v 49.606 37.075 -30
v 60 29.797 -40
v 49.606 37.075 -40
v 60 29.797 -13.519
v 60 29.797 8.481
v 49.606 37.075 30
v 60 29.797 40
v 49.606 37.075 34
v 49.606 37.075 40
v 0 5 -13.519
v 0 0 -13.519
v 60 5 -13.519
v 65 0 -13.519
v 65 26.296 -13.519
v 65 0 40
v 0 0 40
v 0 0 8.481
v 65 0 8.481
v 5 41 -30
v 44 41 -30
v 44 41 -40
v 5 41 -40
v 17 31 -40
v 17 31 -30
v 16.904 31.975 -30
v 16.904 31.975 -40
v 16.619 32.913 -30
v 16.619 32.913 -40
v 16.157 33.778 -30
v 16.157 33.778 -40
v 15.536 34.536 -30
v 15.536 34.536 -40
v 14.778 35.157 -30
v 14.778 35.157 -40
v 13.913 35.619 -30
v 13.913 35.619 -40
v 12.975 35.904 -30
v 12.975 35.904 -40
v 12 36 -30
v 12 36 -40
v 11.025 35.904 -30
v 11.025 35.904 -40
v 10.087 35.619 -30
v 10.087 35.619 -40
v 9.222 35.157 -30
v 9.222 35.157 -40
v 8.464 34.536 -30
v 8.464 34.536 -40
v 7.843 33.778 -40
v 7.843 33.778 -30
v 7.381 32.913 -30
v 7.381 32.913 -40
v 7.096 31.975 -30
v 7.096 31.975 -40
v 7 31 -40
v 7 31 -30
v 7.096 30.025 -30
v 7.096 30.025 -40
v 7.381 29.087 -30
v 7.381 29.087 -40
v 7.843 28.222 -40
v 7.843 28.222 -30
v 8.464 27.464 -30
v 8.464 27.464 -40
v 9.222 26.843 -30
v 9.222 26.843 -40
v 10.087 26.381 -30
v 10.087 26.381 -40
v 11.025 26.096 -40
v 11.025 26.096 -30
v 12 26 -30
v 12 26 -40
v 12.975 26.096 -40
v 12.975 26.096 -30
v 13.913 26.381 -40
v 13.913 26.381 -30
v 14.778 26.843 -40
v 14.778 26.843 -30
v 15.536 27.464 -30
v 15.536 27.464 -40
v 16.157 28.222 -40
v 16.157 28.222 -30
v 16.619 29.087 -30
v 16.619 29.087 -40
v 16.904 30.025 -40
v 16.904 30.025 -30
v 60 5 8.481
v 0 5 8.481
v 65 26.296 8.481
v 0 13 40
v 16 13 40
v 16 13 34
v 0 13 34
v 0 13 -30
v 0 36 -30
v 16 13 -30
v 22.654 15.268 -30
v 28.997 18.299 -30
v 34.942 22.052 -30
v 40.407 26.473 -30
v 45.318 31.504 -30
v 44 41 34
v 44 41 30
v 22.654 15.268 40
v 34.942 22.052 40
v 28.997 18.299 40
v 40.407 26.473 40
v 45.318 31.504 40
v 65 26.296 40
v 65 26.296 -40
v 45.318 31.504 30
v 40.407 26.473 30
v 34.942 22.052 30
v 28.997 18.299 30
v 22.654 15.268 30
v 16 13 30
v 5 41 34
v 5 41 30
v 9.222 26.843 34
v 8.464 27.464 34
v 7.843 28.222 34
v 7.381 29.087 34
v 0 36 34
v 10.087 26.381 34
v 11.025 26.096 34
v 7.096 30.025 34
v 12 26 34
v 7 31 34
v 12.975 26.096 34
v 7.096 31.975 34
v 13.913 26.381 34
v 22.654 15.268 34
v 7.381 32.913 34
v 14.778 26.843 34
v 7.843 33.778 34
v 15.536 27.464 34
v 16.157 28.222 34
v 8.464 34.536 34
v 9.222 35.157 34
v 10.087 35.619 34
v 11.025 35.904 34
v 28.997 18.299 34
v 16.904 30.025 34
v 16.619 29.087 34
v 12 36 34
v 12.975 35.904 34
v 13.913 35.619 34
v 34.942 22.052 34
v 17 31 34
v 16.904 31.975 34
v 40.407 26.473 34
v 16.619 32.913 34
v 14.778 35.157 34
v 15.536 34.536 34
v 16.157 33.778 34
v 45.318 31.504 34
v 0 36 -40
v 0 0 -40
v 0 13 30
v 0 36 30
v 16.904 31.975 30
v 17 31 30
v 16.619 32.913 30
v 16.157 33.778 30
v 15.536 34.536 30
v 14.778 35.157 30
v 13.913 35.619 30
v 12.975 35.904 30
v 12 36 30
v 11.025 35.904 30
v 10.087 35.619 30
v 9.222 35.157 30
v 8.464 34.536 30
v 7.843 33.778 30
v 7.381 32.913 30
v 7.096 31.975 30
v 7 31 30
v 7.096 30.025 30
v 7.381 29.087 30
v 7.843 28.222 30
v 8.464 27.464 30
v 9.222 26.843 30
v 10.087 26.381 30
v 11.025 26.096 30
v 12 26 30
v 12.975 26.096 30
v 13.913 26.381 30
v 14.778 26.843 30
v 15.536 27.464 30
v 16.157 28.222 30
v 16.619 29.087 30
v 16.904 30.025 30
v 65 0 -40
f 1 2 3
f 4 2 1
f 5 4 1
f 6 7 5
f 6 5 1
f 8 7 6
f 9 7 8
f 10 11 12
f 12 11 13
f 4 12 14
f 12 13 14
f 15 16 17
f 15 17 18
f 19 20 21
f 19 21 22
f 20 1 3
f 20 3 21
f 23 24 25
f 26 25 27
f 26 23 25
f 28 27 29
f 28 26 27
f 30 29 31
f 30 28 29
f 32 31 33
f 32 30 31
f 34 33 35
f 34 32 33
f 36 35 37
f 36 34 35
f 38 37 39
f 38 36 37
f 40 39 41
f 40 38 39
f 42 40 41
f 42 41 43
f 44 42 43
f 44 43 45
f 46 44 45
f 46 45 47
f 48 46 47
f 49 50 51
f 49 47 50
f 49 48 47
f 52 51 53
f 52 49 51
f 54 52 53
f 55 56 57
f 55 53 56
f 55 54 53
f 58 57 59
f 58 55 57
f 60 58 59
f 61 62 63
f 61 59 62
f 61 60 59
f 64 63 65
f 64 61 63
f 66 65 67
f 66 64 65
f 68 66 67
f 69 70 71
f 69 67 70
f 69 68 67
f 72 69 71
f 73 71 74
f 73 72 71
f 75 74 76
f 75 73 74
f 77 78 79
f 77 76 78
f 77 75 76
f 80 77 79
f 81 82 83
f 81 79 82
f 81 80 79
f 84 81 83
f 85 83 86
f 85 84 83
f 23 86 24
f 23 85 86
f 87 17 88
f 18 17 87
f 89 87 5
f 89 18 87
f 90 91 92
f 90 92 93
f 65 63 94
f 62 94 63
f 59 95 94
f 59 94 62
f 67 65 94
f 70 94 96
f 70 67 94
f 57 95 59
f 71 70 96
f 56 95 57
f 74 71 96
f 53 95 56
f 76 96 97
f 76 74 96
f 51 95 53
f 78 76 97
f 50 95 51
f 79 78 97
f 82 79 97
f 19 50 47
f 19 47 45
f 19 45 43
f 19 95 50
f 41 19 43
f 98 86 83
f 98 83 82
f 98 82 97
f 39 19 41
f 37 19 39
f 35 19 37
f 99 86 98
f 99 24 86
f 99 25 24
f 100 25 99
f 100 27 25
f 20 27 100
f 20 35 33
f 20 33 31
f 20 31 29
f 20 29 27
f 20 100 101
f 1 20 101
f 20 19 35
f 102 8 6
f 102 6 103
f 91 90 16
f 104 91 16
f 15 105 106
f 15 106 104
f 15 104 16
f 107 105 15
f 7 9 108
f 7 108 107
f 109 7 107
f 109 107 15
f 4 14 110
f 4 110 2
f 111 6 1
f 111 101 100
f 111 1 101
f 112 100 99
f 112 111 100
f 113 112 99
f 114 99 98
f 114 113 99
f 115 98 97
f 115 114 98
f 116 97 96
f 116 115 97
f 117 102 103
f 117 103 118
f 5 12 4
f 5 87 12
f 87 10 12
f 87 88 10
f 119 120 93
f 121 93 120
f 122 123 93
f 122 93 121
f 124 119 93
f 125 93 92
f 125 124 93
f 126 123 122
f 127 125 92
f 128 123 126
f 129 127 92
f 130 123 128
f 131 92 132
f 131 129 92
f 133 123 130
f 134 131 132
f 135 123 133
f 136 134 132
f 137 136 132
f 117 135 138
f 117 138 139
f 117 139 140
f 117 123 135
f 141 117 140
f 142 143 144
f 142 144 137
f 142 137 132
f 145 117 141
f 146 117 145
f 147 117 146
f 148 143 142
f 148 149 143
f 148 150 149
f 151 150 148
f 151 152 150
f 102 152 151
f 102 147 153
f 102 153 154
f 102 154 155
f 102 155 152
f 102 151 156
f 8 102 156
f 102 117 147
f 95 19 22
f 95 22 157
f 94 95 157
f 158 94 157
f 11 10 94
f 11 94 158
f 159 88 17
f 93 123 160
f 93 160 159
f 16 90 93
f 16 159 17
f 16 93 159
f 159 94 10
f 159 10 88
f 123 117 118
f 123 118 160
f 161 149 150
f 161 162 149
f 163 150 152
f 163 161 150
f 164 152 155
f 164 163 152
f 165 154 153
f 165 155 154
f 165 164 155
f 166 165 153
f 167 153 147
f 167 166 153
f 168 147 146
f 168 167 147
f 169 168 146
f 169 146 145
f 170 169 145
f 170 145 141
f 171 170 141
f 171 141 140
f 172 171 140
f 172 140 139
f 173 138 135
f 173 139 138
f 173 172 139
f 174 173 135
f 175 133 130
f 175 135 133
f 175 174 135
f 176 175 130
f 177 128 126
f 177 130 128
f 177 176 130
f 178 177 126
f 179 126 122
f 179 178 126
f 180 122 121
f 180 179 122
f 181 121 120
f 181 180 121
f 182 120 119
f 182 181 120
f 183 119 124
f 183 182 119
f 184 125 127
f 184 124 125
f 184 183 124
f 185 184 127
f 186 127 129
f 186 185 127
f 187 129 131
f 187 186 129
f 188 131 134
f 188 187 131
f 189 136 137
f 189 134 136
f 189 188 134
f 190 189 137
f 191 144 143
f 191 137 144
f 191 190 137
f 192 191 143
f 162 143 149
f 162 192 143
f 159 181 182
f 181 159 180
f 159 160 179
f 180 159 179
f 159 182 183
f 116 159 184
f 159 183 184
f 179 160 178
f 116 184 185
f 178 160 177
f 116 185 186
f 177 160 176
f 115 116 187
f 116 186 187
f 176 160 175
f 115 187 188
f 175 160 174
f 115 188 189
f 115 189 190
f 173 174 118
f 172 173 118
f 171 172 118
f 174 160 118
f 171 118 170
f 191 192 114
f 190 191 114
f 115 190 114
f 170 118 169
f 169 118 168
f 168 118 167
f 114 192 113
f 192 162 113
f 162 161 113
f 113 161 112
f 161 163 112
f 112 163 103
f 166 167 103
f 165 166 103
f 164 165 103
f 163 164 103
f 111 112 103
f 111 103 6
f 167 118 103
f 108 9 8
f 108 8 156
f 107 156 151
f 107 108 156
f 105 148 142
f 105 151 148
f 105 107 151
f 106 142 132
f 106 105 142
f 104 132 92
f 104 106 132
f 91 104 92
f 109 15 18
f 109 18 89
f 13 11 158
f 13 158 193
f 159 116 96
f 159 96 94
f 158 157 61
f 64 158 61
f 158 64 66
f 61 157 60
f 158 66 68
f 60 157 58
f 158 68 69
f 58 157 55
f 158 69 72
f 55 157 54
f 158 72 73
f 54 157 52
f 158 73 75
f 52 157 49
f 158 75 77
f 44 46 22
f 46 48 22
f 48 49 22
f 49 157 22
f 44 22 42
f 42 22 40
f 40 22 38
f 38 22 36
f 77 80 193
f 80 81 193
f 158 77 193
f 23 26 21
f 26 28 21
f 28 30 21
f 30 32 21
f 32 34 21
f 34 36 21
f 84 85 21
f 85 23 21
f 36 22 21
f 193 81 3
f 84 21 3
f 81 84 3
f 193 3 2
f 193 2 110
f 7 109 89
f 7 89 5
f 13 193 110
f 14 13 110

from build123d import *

# Parameters (mm, degrees)
SKETCH1_R            = 5
BOSS_EXTRUDE9_DEPTH  = 40
SKETCH6_W            = 49.606003438
SKETCH6_H            = 60
SKETCH6_H_2          = 6
CUT_EXTRUDE5_DEPTH   = 40
BOSS_EXTRUDE11_DEPTH = 40
SKETCH7_W            = 22
SKETCH7_H            = 29.796679389
CUT_EXTRUDE6_DEPTH   = 80
BOSS_EXTRUDE12_DEPTH = 40


with BuildPart() as part:
    # Sketch1 → Boss-Extrude9 (new, symmetric)
    with BuildSketch(Plane.XY):
        with BuildLine():
            ThreePointArc((16, 13), (34.941864918, 22.051658235), (49.606003438, 37.074634133))
            Line((49.606003438, 37.074634133), (44, 41))
            Line((44, 41), (5, 41))
            Line((5, 41), (0, 36))
            Line((0, 36), (0, 13))
            Line((0, 13), (16, 13))
        make_face()
        with Locations((12, 31)):
            Circle(SKETCH1_R, mode=Mode.SUBTRACT)
    extrude(amount=BOSS_EXTRUDE9_DEPTH, both=True)

    # Sketch6 → Cut-Extrude5 (cut)
    with BuildSketch(Plane(origin=(0, 41, 0), x_dir=(1, 0, 0), z_dir=(0, 1, 0))):
        with Locations((24.803001719, 0)):
            Rectangle(SKETCH6_W, SKETCH6_H)
        with Locations((24.803001719, -37)):
            Rectangle(SKETCH6_W, SKETCH6_H_2)
    extrude(amount=-CUT_EXTRUDE5_DEPTH, mode=Mode.SUBTRACT)


with BuildPart() as cut_extrude5_piece_1:
    # of the separate pieces the step leaves, piece 1, a body of its own (cut_extrude5_pieces)
    add(part.part.solids().sort_by_distance((16, 13, -30))[0])



with BuildPart() as cut_extrude5_piece_2:
    # of the separate pieces the step leaves, piece 2, a body of its own (cut_extrude5_pieces)
    add(part.part.solids().sort_by_distance((16, 13, 34))[0])


with BuildPart() as body_3:
    # Sketch1<13> → Boss-Extrude11 (new, symmetric)
    with BuildSketch(Plane.XY):
        Polygon((65, 26.295641698), (60, 29.796679389), (60, 5), (0, 5), (0, 0), (65, 0), align=None)
    extrude(amount=BOSS_EXTRUDE11_DEPTH, both=True)

    # Sketch7 → Cut-Extrude6 (cut)
    with BuildSketch(Plane(origin=(65, 0, 0), x_dir=(0, 0, -1), z_dir=(1, 0, 0))):
        with Locations((2.518815971, 14.898339695)):
            Rectangle(SKETCH7_W, SKETCH7_H)
    extrude(amount=-CUT_EXTRUDE6_DEPTH, mode=Mode.SUBTRACT)


with BuildPart() as cut_extrude6_piece_1:
    # of the separate pieces the step leaves, piece 1, a body of its own (cut_extrude6_pieces)
    add(body_3.part.solids().sort_by_distance((65, 26.295641698, 40))[0])


with BuildPart() as cut_extrude6_piece_2:
    # of the separate pieces the step leaves, piece 2, a body of its own (cut_extrude6_pieces)
    add(body_3.part.solids().sort_by_distance((65, 26.295641698, -13.518815971))[0])


with BuildPart() as cut_extrude5_piece_1_1:
    add(cut_extrude5_piece_1.part)

    add(cut_extrude5_piece_2.part)  # Boss-Extrude12 merges Cut-Extrude5 piece 2

    add(cut_extrude6_piece_1.part)  # Boss-Extrude12 merges Cut-Extrude6 piece 1

    add(cut_extrude6_piece_2.part)  # Boss-Extrude12 merges Cut-Extrude6 piece 2
    # Sketch1<14> → Boss-Extrude12 (add, symmetric)
    with BuildSketch(Plane.XY):
        with BuildLine():
            Line((60, 5), (60, 29.796679389))
            Line((60, 29.796679389), (49.606003438, 37.074634133))
            ThreePointArc((49.606003438, 37.074634133), (34.941864918, 22.051658235), (16, 13))
            Line((16, 13), (0, 13))
            Line((0, 13), (0, 5))
            Line((0, 5), (60, 5))
        make_face()
    extrude(amount=BOSS_EXTRUDE12_DEPTH, both=True)


solid = cut_extrude5_piece_1_1.part
